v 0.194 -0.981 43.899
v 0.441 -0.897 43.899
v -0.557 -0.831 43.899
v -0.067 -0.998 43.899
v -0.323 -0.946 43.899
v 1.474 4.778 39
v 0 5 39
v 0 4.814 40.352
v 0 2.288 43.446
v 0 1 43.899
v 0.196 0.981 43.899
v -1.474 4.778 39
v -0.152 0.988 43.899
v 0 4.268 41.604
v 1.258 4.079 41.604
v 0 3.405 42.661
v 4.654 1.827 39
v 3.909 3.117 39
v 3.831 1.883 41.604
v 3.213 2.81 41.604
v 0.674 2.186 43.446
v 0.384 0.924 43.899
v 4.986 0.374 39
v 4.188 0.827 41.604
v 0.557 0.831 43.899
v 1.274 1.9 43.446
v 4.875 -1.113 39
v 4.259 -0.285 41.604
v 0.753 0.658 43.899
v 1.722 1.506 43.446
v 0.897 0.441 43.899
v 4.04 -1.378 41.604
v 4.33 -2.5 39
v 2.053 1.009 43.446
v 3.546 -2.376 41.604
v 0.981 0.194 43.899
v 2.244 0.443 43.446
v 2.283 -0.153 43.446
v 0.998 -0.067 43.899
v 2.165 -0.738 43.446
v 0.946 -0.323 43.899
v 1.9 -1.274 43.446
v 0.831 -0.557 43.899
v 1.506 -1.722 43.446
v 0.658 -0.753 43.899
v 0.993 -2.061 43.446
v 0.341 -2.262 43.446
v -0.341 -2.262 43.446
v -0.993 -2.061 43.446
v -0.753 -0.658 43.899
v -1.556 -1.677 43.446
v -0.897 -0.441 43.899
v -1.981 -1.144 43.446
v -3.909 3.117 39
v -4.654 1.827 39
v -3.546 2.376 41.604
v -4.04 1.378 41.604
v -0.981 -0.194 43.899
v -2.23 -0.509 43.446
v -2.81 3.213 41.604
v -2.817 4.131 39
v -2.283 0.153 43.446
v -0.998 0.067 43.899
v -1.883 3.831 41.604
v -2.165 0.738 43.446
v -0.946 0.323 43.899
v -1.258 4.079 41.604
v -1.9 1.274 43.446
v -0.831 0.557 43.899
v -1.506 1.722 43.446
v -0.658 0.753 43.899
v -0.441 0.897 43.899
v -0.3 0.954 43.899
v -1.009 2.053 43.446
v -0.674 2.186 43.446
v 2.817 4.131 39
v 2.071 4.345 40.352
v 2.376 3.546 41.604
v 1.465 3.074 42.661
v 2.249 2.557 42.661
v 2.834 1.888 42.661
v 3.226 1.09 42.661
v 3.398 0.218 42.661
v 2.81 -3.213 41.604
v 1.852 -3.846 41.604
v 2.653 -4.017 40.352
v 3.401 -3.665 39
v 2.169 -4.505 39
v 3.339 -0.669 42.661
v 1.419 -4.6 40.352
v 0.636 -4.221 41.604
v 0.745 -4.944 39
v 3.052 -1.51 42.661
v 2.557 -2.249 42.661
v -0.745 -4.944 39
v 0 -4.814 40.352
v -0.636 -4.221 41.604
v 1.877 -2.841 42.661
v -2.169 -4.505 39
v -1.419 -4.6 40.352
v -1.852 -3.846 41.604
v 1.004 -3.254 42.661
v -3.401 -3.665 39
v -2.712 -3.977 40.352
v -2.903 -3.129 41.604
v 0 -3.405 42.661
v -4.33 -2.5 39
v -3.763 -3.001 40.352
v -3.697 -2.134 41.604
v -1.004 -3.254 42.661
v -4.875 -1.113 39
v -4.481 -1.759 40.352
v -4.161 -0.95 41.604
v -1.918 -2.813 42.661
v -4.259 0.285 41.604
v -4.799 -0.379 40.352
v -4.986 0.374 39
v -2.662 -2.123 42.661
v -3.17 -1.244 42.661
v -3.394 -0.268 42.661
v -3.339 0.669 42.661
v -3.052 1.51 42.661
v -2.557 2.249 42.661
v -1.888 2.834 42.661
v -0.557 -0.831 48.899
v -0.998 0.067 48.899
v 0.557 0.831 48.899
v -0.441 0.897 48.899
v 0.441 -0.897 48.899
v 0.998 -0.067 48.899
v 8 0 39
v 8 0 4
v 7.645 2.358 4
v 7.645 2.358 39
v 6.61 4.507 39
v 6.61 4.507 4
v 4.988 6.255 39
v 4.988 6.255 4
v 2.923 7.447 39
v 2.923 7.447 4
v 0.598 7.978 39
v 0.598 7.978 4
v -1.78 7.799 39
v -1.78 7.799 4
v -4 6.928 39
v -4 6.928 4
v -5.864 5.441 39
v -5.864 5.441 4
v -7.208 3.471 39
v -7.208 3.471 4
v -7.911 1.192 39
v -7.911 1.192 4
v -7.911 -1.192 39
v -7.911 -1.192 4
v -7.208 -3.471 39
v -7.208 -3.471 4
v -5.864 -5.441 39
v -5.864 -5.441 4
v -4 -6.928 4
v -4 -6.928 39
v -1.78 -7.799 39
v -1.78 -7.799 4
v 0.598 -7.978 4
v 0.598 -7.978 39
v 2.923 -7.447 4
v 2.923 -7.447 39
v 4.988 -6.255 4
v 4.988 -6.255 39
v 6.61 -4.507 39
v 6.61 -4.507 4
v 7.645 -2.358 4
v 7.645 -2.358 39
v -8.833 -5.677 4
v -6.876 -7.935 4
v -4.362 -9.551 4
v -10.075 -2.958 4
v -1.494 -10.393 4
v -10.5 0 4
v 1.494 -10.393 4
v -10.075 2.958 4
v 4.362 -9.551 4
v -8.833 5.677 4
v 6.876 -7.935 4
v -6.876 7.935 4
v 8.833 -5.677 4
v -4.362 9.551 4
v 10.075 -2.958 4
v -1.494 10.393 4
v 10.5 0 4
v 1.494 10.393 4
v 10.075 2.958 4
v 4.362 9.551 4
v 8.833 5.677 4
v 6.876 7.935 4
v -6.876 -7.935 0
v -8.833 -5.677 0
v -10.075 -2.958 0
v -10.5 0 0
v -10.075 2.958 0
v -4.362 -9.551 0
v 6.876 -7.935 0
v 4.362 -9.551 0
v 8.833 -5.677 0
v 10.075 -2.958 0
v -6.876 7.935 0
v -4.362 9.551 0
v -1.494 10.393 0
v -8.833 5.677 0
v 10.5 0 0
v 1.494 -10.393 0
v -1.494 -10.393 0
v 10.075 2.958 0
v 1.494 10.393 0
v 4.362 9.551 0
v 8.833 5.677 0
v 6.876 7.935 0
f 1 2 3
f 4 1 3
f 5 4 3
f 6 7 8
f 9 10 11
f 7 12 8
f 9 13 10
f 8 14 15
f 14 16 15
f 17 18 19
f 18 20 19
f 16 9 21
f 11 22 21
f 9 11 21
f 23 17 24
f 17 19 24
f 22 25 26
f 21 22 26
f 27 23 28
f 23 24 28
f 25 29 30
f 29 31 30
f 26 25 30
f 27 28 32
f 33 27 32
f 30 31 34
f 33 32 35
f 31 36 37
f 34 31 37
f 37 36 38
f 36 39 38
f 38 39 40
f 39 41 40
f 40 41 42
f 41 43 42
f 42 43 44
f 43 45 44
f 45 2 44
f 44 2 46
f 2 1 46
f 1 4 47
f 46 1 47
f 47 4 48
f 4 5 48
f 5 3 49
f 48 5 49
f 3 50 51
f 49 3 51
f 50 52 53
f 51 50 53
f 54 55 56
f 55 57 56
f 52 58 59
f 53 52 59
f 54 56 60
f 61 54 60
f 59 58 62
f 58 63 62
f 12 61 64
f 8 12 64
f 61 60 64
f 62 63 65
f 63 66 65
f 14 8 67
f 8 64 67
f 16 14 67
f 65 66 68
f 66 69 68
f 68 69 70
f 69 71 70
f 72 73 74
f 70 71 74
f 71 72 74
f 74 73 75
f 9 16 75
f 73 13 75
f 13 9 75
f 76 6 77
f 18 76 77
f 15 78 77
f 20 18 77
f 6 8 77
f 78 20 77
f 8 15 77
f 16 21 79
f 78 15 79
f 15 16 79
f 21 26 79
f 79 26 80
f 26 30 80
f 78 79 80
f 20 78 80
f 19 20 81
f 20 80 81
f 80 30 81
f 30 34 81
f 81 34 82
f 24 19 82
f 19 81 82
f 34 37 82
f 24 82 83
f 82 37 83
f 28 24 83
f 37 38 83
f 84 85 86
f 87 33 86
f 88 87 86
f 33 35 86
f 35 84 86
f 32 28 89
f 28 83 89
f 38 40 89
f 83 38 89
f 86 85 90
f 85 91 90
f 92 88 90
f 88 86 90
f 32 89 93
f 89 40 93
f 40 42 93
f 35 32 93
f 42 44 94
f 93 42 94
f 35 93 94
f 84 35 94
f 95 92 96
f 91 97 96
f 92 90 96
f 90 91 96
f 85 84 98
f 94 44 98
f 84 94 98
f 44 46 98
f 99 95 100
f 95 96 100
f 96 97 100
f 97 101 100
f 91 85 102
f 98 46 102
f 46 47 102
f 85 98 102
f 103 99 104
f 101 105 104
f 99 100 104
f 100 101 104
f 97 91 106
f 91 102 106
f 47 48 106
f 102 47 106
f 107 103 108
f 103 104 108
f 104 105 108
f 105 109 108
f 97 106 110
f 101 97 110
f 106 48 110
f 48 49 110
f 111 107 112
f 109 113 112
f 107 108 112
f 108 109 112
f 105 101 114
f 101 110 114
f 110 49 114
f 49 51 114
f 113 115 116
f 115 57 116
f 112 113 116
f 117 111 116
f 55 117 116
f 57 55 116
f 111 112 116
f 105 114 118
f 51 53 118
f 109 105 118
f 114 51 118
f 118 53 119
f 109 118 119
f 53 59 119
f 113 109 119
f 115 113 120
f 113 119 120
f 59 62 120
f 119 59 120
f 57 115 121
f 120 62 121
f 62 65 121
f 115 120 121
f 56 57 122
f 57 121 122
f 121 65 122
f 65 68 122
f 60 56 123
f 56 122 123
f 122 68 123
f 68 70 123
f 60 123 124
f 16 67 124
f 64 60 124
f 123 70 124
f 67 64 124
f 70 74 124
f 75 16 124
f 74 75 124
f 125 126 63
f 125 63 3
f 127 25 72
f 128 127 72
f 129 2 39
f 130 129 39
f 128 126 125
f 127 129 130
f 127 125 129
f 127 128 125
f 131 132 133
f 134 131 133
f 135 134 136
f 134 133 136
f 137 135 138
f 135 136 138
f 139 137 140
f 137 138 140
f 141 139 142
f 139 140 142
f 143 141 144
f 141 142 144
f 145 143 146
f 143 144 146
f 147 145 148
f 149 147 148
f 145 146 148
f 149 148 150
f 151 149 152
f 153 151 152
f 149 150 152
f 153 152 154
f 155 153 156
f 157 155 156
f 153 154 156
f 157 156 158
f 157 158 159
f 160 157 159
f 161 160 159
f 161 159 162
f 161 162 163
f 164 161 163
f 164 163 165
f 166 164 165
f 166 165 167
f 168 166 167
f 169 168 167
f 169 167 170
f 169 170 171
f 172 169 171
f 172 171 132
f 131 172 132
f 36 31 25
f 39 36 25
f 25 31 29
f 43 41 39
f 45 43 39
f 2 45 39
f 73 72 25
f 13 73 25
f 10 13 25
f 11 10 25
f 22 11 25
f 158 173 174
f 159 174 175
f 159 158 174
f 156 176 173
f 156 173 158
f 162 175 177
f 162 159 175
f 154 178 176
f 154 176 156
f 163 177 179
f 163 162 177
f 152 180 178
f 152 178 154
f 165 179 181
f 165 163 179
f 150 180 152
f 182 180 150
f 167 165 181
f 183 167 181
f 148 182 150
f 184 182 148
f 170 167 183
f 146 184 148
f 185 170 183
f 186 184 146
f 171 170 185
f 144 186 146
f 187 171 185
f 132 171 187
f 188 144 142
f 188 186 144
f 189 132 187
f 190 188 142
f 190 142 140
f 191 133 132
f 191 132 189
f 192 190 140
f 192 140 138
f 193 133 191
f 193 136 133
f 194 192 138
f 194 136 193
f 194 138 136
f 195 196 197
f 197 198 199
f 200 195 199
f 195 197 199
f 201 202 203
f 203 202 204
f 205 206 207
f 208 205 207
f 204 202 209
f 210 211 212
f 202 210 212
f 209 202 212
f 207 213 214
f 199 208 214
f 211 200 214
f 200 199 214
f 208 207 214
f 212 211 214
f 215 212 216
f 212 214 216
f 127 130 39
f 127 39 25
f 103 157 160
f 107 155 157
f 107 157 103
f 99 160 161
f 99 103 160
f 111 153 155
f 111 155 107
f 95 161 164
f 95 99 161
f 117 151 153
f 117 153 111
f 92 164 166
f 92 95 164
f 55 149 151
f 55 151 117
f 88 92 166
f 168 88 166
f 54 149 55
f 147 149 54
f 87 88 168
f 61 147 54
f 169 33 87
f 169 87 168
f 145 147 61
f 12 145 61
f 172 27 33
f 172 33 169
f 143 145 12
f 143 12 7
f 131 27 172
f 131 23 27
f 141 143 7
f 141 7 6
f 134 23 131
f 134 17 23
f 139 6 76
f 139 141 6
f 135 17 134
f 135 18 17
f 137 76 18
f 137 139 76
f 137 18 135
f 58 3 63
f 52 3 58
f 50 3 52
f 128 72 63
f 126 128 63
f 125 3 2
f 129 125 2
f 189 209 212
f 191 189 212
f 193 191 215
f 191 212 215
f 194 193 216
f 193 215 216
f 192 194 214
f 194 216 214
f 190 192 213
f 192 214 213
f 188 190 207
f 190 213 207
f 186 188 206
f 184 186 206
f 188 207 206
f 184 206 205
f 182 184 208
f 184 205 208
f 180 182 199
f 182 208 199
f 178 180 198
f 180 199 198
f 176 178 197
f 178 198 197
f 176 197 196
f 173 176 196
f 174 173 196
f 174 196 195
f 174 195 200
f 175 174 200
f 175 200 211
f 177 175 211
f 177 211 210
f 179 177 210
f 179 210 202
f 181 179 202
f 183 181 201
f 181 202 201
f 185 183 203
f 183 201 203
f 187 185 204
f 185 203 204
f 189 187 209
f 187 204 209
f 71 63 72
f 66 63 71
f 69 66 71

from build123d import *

# Parameters (mm, degrees)
F0_R     = 10.5
F1_DEPTH = 4
F2_R     = 8
F3_DEPTH = 39
F7_DEPTH = 5


with BuildPart() as f1:
    # F0 (on Top) → F1 (new body)
    with BuildSketch(Plane.XY):
        Circle(F0_R)
    extrude(amount=F1_DEPTH)

    # F2 (on Top) → F3 (join)
    with BuildSketch(Plane.XY):
        Circle(F2_R)
    extrude(amount=F3_DEPTH)

    # F4 (on Right) → F5 (revolve)
    with BuildSketch(Plane.YZ):
        with BuildLine():
            Line((1, 43.898979), (0, 43.898979))
            Line((0, 43.898979), (0, 39))
            Line((0, 39), (5, 39))
            ThreePointArc((5, 39), (3.872983, 42.162278), (1, 43.898979))
        make_face()
    revolve(axis=Axis((0, 0, 41.5), (0, 0, -1)))

    # F6 (on face) → F7 (join)
    with BuildSketch(Plane.XY.offset(43.898979)):
        Polygon((0.441064, -0.897476), (0.997769, -0.066766), (0.556705, 0.83071), (-0.441064, 0.897476), (-0.997769, 0.066766), (-0.556705, -0.83071), align=None)
    extrude(amount=F7_DEPTH)


solid = f1.part
